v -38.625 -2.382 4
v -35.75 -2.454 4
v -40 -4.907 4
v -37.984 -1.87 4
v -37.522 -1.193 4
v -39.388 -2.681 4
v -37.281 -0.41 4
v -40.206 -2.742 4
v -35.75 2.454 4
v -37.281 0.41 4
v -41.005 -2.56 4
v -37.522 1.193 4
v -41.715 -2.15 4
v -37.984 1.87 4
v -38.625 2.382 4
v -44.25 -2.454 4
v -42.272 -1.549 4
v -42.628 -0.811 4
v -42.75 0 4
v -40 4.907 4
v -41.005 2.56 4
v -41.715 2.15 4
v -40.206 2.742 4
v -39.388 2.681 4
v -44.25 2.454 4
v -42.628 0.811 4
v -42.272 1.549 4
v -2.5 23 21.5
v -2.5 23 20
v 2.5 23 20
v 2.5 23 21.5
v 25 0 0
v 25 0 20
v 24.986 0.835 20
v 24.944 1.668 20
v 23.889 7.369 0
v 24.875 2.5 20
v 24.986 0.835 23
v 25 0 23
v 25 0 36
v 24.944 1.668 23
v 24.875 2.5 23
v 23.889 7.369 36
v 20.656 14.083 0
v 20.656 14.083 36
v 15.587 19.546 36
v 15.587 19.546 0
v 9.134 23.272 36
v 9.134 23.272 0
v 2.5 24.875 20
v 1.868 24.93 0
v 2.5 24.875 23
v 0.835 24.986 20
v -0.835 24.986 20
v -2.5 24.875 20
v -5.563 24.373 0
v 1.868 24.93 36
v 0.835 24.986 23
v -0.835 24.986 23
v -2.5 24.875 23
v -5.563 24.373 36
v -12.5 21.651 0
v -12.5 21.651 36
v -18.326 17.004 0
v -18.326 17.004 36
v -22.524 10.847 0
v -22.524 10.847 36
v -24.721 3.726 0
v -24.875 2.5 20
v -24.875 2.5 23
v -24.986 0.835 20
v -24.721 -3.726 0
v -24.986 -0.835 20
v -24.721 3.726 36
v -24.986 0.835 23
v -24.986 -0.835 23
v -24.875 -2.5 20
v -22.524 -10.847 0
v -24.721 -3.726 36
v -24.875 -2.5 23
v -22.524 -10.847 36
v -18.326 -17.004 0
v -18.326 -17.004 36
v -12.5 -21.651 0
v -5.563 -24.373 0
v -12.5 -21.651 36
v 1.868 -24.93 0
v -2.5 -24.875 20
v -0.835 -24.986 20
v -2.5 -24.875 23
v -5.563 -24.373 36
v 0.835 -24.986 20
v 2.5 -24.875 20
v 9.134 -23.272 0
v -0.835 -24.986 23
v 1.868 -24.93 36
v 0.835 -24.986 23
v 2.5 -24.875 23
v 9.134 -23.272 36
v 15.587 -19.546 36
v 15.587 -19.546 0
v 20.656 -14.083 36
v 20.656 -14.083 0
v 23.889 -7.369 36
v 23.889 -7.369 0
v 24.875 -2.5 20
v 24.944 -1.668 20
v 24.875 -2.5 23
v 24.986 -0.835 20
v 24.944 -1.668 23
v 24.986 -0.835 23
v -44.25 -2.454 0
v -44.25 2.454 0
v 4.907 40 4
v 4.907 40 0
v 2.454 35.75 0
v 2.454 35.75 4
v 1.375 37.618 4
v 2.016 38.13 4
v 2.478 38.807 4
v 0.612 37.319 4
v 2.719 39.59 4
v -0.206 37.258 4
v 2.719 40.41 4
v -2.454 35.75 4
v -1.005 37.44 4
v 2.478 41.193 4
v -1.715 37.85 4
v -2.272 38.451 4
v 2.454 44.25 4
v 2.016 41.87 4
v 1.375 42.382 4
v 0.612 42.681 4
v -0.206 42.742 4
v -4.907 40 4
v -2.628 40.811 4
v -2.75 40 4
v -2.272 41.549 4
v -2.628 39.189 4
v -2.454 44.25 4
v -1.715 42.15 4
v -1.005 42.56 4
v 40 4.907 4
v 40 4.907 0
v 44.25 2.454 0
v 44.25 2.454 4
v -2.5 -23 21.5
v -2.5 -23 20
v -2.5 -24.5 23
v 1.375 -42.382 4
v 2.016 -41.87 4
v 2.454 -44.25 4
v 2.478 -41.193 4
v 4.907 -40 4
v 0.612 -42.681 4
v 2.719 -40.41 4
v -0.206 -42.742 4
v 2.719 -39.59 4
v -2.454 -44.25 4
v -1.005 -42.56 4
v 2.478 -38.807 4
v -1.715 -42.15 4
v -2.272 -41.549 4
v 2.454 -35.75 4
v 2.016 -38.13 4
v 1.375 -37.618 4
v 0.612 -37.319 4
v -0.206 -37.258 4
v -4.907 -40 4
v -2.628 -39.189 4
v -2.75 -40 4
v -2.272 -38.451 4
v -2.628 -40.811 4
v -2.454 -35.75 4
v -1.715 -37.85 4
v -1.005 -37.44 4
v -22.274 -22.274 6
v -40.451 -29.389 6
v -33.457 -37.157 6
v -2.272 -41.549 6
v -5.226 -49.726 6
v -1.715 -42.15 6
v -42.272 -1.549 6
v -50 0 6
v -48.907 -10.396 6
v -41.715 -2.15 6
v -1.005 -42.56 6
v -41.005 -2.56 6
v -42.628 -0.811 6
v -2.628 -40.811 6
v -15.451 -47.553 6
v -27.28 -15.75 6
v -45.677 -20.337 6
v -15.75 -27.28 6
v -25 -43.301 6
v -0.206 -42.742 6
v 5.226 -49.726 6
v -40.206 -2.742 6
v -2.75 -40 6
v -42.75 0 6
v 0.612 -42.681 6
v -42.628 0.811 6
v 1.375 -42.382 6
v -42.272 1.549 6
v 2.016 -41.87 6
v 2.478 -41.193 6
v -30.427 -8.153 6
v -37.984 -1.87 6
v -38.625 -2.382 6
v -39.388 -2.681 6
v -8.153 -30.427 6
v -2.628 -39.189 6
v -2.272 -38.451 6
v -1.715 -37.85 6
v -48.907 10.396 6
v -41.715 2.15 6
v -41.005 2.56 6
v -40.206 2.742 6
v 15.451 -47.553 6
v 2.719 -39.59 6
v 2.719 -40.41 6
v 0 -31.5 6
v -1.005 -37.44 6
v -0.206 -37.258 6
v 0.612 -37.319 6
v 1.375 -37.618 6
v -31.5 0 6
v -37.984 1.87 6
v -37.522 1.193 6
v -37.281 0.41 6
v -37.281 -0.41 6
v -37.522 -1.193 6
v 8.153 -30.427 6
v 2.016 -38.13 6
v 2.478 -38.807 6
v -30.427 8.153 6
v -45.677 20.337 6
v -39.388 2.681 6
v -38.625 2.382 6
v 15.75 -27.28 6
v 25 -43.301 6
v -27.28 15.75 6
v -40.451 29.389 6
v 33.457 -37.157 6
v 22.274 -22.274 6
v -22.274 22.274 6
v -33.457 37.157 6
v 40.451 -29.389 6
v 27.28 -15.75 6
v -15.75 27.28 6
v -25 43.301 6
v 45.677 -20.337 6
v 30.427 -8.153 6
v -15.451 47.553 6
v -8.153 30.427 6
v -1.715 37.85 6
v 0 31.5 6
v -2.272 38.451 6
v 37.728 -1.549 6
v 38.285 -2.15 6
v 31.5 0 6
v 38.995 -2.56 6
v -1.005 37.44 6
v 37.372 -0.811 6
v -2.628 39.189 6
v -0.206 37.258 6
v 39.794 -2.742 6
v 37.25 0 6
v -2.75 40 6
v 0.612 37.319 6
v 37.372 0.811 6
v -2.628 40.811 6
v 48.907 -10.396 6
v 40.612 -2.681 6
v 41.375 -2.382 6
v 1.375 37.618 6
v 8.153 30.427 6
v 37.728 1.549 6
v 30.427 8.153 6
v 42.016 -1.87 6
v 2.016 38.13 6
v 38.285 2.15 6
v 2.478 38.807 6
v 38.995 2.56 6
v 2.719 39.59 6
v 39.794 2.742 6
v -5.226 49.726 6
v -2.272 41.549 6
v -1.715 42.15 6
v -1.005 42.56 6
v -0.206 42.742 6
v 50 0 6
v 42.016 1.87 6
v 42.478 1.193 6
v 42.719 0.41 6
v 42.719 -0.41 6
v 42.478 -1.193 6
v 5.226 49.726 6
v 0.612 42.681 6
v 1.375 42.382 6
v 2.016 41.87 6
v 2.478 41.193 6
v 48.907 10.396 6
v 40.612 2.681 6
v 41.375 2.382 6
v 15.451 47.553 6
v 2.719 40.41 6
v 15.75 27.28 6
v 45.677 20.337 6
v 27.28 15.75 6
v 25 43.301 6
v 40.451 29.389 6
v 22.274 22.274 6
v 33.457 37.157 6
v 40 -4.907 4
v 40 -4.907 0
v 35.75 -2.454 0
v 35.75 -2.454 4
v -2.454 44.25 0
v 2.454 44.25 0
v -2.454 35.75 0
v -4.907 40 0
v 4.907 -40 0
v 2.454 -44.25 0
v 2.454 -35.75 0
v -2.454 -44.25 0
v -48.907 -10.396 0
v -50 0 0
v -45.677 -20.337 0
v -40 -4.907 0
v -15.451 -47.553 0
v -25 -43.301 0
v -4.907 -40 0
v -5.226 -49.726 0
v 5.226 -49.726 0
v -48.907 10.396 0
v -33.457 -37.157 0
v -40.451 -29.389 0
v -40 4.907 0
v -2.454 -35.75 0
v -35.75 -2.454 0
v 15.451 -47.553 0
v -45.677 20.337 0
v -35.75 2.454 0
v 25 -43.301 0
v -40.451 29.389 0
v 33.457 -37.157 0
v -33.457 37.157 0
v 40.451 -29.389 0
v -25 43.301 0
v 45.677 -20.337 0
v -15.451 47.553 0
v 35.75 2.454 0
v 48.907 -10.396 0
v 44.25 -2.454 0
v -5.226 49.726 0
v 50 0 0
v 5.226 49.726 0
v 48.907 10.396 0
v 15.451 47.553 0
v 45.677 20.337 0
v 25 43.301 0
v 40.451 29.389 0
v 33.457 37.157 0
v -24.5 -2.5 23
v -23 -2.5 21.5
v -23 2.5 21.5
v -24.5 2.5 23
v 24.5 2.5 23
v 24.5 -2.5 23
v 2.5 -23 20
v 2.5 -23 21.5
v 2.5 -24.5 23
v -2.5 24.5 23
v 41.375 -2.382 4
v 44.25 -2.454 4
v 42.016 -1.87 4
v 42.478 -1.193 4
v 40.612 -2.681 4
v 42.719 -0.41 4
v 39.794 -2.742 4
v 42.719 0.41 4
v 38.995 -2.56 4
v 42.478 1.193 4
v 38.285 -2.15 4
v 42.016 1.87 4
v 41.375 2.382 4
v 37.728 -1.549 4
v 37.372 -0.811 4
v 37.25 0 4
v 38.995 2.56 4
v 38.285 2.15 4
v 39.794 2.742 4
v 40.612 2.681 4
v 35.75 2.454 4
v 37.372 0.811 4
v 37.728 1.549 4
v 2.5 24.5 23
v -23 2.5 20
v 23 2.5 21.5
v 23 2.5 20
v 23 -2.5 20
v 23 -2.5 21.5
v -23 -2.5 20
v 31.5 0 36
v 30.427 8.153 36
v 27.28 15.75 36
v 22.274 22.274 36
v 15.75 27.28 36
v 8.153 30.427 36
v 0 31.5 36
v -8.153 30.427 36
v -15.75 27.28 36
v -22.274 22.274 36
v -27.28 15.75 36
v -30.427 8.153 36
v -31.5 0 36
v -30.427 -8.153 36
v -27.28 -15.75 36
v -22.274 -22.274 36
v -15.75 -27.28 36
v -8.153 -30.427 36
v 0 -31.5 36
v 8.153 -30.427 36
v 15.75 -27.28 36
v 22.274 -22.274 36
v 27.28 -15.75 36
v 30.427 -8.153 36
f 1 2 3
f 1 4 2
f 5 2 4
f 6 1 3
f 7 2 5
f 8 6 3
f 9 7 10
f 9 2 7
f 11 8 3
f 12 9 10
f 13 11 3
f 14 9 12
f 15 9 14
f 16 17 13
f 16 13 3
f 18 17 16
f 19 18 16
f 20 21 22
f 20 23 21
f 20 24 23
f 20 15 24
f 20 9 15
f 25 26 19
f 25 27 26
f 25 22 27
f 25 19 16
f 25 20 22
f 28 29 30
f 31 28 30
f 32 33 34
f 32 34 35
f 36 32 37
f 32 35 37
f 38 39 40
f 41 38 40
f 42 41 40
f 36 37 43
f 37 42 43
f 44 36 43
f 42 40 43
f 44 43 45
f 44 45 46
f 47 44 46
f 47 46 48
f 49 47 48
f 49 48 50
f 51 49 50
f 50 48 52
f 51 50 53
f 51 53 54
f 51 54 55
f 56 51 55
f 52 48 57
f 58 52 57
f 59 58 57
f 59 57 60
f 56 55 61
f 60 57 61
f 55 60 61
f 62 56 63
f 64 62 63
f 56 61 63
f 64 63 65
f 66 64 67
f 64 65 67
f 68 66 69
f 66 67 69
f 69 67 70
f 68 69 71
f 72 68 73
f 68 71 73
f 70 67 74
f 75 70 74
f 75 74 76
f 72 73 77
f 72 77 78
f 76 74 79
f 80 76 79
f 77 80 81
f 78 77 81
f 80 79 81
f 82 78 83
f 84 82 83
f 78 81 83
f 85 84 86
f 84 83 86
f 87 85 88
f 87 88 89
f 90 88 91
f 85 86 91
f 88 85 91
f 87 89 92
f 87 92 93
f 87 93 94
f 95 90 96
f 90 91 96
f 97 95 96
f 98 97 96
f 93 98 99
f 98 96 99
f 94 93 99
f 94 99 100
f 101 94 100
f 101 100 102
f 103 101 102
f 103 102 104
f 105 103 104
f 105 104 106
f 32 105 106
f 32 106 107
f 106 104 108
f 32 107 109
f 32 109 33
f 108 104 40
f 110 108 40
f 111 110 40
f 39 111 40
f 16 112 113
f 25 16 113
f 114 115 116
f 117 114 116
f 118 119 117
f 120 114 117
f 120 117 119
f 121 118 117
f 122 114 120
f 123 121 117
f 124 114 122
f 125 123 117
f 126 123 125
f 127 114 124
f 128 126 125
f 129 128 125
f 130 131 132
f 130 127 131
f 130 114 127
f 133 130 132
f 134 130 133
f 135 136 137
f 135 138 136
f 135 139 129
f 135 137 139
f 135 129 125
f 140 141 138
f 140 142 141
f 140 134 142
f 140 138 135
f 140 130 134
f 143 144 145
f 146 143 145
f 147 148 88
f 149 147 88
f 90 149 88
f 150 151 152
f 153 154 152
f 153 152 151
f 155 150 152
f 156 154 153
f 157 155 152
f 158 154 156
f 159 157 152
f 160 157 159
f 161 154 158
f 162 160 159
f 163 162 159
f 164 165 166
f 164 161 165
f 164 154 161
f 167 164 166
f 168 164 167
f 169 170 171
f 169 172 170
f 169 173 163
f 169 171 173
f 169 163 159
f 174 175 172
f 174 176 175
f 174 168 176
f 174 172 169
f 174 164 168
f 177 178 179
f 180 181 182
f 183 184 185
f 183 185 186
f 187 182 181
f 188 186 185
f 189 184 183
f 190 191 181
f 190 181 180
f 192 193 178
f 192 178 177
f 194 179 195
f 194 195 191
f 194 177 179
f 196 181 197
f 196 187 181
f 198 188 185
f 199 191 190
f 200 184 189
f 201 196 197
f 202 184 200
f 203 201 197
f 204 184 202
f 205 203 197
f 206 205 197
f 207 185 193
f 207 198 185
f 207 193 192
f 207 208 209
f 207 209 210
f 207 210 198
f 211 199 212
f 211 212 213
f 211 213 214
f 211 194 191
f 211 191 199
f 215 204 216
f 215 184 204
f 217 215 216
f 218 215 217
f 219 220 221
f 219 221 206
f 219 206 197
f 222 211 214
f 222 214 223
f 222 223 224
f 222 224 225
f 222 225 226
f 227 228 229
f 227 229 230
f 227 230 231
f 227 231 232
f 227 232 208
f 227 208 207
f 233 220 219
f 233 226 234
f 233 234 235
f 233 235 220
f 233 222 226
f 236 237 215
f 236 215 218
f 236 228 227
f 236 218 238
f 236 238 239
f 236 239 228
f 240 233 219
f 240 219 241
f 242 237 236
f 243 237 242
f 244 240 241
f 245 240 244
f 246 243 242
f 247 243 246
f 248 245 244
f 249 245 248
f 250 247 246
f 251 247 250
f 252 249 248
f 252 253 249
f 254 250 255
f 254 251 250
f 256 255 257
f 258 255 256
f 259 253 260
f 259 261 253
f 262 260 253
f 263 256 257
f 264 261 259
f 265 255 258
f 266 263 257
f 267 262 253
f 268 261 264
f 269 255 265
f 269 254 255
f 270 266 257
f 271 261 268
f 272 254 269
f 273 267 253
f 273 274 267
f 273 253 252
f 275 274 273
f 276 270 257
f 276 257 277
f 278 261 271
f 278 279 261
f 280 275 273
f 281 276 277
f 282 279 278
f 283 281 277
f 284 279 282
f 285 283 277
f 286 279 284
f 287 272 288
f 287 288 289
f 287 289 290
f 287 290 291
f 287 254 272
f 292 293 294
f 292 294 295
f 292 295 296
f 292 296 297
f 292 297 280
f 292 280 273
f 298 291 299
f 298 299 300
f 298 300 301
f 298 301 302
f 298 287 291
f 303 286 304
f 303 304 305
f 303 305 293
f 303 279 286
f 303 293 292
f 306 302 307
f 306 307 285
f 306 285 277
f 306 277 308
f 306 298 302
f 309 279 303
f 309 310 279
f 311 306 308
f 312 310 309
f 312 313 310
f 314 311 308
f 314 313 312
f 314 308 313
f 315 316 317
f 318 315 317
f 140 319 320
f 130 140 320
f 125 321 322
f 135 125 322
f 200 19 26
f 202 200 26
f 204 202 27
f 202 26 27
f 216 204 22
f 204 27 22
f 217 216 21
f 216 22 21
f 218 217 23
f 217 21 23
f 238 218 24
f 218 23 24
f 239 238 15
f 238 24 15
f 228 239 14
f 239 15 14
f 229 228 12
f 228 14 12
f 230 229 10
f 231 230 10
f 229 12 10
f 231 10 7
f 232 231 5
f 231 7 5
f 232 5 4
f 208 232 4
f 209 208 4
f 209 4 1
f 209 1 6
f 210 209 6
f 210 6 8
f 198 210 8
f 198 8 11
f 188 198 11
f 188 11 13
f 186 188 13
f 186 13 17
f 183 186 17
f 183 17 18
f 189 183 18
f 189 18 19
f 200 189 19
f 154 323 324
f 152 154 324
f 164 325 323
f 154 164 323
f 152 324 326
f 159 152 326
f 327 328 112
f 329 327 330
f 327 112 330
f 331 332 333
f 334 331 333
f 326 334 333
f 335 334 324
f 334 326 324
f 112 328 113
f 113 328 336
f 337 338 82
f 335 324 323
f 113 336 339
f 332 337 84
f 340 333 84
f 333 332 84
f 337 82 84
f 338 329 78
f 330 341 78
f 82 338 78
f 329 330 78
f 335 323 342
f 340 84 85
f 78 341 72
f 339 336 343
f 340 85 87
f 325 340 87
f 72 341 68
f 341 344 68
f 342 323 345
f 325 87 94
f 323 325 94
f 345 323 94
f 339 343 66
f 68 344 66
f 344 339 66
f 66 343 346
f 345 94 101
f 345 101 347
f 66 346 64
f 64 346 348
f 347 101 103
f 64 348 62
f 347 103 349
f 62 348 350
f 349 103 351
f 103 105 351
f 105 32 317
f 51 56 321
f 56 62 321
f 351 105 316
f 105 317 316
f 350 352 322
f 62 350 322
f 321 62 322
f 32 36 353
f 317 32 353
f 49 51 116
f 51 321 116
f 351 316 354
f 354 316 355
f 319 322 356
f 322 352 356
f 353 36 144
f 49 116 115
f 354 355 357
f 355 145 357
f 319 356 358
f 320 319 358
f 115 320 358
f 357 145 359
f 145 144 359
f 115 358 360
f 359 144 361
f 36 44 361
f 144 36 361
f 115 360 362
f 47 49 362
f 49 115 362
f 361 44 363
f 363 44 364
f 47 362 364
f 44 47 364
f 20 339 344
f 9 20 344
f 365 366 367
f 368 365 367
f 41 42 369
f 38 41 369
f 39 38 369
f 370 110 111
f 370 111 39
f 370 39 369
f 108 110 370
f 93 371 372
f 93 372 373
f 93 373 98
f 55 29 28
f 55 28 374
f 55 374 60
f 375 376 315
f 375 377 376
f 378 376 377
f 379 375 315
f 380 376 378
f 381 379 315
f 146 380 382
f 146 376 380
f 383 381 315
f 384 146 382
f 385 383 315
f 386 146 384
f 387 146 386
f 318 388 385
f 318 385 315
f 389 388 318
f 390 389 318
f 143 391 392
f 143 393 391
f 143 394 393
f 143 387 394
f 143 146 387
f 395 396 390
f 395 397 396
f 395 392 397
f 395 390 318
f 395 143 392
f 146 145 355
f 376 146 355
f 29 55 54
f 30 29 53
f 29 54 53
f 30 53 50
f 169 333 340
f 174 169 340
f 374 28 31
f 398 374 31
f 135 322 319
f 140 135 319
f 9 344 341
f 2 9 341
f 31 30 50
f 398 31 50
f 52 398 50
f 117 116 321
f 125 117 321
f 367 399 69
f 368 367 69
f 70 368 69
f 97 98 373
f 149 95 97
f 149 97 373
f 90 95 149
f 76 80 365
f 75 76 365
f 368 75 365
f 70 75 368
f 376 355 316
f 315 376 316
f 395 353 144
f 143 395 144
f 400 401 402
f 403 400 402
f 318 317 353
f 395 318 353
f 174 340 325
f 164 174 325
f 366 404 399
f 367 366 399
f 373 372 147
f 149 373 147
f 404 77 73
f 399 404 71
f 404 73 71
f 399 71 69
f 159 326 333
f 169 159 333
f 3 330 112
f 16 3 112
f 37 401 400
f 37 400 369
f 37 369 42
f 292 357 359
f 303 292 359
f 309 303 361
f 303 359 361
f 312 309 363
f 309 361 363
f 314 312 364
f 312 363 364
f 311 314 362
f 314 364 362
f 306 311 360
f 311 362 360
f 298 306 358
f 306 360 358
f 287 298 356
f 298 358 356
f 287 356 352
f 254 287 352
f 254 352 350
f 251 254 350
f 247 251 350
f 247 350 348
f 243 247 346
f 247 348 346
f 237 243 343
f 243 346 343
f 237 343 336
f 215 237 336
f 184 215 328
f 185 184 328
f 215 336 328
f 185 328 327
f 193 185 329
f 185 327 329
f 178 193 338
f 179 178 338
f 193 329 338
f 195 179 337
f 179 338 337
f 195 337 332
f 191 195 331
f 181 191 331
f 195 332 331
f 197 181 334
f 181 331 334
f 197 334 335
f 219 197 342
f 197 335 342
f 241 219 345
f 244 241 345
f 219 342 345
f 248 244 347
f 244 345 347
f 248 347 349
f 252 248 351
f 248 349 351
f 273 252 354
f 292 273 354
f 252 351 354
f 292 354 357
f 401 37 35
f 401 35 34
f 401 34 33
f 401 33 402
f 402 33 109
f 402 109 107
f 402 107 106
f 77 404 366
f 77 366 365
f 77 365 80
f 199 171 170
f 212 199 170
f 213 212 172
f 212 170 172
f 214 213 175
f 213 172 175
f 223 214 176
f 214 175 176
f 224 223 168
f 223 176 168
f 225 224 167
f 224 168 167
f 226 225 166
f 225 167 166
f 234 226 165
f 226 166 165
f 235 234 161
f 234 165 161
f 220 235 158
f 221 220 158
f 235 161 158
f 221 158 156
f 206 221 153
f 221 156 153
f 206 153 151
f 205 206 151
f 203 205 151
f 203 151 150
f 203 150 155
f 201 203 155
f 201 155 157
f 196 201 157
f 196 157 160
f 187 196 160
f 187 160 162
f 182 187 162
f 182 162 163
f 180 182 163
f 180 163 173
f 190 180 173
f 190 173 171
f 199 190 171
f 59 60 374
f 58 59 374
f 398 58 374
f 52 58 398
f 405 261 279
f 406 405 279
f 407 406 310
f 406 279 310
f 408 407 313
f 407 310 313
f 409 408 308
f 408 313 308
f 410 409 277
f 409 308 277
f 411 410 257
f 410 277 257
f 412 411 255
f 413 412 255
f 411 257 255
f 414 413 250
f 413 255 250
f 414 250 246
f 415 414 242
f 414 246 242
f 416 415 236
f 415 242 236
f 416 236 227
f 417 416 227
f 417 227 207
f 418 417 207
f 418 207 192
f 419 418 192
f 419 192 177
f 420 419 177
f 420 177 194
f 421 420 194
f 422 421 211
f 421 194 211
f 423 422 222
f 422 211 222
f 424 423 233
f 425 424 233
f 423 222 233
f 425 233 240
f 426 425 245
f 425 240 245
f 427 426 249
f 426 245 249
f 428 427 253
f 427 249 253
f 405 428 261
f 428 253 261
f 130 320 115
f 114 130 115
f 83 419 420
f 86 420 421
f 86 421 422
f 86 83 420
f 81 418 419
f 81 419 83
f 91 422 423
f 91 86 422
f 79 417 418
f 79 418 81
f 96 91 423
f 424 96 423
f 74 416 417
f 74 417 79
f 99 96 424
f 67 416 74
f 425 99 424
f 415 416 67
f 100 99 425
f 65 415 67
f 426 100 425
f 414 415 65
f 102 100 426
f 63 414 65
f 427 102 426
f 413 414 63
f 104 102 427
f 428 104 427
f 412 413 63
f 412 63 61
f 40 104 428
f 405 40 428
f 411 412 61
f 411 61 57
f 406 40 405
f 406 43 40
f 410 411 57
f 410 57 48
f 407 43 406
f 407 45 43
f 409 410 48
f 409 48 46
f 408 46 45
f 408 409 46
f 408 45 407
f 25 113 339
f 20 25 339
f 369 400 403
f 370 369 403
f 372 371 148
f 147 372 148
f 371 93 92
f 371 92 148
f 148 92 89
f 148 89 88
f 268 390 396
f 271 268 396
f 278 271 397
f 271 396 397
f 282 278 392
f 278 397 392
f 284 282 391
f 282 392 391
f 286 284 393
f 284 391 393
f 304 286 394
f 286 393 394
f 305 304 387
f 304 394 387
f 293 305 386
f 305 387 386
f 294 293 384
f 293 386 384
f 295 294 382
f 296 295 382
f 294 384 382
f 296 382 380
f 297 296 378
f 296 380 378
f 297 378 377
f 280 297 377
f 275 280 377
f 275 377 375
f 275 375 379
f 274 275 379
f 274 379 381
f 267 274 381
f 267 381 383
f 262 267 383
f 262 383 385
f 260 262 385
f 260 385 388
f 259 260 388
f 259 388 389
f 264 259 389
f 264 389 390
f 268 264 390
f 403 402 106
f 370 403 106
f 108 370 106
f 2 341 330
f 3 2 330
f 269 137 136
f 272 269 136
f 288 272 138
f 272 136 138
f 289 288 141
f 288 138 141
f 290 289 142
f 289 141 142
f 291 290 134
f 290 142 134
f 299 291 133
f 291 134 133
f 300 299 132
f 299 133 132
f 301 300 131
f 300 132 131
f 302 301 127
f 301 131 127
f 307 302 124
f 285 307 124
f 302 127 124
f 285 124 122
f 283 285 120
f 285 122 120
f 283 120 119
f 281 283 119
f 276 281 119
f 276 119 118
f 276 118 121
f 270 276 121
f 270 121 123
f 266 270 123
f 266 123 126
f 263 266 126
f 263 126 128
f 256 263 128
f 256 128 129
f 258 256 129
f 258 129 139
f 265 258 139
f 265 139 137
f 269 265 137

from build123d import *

# Parameters (mm, degrees)
SZKIC1_R                         = 50
DODANIE_WYCI_GNI_CIE1_DEPTH      = 6
SZKIC2_R                         = 31.5
DODANIE_WYCI_GNI_CIE2_DEPTH      = 30
SZKIC3_R                         = 25
WYTNIJ_WYCI_GNI_CIE1_DEPTH       = 80.3473377
SZKIC4_W                         = 5
SZKIC4_H                         = 5
DODANIE_WYCI_GNI_CIE3_DEPTH      = 3
SFAZOWANIE2_SIZE                 = 1.5
SZYK_KO_OWY3_COUNT               = 4
SFAZOWANIE2_OF_SZYK_KO_OWY3_SIZE = 1.5
WYTNIJ_WYCI_GNI_CIE2_DEPTH       = 4
SZKIC6_R                         = 2.75
WYTNIJ_WYCI_GNI_CIE3_DEPTH       = 78.614431648


with BuildPart() as part:
    # Szkic1 → Dodanie-wyciągnięcie1 (new body)
    with BuildSketch(Plane.XY):
        Circle(SZKIC1_R)
    extrude(amount=DODANIE_WYCI_GNI_CIE1_DEPTH)

    # Szkic2 → Dodanie-wyciągnięcie2 (add)
    with BuildSketch(Plane.XY.offset(6)):
        Circle(SZKIC2_R)
    extrude(amount=DODANIE_WYCI_GNI_CIE2_DEPTH)

    # Szkic3 → Wytnij-wyciągnięcie1 (cut, through all)
    with BuildSketch(Plane.XY.offset(36)):
        Circle(SZKIC3_R)
    extrude(amount=-WYTNIJ_WYCI_GNI_CIE1_DEPTH, mode=Mode.SUBTRACT)

    # Szkic4 → Dodanie-wyciągnięcie3 (add)
    with BuildSketch(Plane.XY.offset(20)):
        with Locations((0, 25.5)):
            Rectangle(SZKIC4_W, SZKIC4_H)
    dodanie_wyci_gni_cie3 = extrude(amount=DODANIE_WYCI_GNI_CIE3_DEPTH)

    # Sfazowanie2
    sfazowanie2_edges = [part.edges().sort_by_distance(p)[0] for p in [
        (0, 23, 23),
    ]]
    chamfer(sfazowanie2_edges, length=SFAZOWANIE2_SIZE)

    # Szyk kołowy3: Dodanie-wyciągnięcie3 ×4 about axis
    szyk_ko_owy3_axis = Axis((0, 0, 36), (0, 0, 1))
    for i in range(1, SZYK_KO_OWY3_COUNT):
        add(dodanie_wyci_gni_cie3.rotate(szyk_ko_owy3_axis, i * 360 / SZYK_KO_OWY3_COUNT))

    # Sfazowanie2 of Szyk kołowy3
    sfazowanie2_of_szyk_ko_owy3_edges = [part.edges().sort_by_distance(p)[0] for p in [
        (-23, 0, 23),
        (0, -23, 23),
        (23, 0, 23),
    ]]
    chamfer(sfazowanie2_of_szyk_ko_owy3_edges, length=SFAZOWANIE2_OF_SZYK_KO_OWY3_SIZE)

    # Szkic5 → Wytnij-wyciągnięcie2 (cut)
    with BuildSketch(Plane(origin=(0, 0, 0), x_dir=(-1, 0, 0), z_dir=(0, 0, -1))):
        Polygon((40, -4.907477288), (44.25, -2.453738644), (44.25, 2.453738644), (40, 4.907477288), (35.75, 2.453738644), (35.75, -2.453738644), align=None)
        Polygon((4.907477288, 40), (2.453738644, 44.25), (-2.453738644, 44.25), (-4.907477288, 40), (-2.453738644, 35.75), (2.453738644, 35.75), align=None)
        Polygon((-4.907477288, -40), (-2.453738644, -44.25), (2.453738644, -44.25), (4.907477288, -40), (2.453738644, -35.75), (-2.453738644, -35.75), align=None)
        Polygon((-40, 4.907477288), (-44.25, 2.453738644), (-44.25, -2.453738644), (-40, -4.907477288), (-35.75, -2.453738644), (-35.75, 2.453738644), align=None)
    extrude(amount=-WYTNIJ_WYCI_GNI_CIE2_DEPTH, mode=Mode.SUBTRACT)

    # Szkic6 → Wytnij-wyciągnięcie3 (cut, through all)
    with BuildSketch(Plane(origin=(0, 0, 4), x_dir=(-1, 0, 0), z_dir=(0, 0, -1))):
        with Locations((0, 40)):
            Circle(SZKIC6_R)
        with Locations((40, 0)):
            Circle(SZKIC6_R)
        with Locations((0, -40)):
            Circle(SZKIC6_R)
        with Locations((-40, 0)):
            Circle(SZKIC6_R)
    extrude(amount=-WYTNIJ_WYCI_GNI_CIE3_DEPTH, mode=Mode.SUBTRACT)


solid = part.part
